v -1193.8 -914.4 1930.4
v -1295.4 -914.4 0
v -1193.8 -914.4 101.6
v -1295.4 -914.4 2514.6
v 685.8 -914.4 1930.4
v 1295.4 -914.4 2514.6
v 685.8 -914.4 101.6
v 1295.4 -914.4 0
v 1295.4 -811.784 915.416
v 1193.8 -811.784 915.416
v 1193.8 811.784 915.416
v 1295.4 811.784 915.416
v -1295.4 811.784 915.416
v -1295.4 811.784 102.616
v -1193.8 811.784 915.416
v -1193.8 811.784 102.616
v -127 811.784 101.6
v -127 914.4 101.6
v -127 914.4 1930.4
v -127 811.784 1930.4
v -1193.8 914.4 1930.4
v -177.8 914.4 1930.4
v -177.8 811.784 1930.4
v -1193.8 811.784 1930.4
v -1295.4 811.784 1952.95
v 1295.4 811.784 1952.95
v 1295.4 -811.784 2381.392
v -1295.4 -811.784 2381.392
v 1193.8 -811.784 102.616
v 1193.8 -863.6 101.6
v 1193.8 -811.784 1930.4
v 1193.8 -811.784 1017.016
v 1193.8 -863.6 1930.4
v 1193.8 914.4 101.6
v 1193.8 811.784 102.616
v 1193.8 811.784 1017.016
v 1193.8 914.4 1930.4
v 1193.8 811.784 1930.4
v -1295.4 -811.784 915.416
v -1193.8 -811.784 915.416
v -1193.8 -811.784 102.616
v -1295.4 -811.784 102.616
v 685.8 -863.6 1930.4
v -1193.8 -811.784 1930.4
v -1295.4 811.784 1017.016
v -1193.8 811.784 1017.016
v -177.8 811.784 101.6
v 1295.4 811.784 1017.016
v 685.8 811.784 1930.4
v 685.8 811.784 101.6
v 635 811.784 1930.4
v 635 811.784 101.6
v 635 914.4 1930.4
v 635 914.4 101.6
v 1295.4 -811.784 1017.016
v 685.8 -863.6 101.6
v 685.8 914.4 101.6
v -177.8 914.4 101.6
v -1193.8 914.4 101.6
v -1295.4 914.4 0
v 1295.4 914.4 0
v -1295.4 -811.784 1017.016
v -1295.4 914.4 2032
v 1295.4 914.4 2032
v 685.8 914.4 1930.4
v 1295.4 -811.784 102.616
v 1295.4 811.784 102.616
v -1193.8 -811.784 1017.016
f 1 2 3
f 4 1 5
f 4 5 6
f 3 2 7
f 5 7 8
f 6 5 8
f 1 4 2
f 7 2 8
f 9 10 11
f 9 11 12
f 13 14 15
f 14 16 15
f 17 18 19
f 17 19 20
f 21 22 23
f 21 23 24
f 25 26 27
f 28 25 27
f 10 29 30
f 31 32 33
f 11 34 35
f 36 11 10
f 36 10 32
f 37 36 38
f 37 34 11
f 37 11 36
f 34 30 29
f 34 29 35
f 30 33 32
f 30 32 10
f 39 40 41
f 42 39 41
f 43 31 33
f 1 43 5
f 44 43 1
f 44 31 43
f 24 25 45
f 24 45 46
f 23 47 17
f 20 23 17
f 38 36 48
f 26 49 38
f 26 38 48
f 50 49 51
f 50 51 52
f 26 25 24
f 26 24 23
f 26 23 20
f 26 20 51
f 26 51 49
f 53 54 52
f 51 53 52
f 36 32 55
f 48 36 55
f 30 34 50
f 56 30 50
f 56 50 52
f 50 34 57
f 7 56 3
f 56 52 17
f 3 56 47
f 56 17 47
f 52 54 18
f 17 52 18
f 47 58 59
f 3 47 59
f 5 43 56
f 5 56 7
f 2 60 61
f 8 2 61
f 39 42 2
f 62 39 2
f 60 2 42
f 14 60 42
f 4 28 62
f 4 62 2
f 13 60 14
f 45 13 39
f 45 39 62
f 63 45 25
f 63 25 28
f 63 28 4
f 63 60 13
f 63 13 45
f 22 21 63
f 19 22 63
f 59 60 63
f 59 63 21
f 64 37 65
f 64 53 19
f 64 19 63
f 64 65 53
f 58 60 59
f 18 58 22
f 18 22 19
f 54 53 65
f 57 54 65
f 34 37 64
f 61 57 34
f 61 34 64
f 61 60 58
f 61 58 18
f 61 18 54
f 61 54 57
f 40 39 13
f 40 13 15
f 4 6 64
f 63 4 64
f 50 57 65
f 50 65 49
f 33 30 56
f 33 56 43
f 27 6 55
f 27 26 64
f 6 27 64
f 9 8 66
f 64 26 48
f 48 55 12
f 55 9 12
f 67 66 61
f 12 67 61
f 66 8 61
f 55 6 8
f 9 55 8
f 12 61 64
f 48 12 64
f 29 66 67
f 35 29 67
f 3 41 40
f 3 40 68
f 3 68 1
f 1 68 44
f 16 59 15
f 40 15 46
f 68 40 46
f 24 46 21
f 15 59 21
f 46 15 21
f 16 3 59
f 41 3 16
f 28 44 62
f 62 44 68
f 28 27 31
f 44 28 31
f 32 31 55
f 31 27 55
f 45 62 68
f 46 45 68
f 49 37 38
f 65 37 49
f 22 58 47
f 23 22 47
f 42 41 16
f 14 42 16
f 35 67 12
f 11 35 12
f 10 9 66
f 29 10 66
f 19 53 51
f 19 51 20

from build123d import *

# Parameters (mm, degrees)
F0_W      = 2590.8
F0_H      = 1828.8
F1_DEPTH  = 2514.6
F3_DEPTH  = 2590.801
F5_DEPTH  = 2590.801
F6_W      = 2387.6
F6_H      = 1828.8
F7_DEPTH  = 1828.801
F8_W      = 101.6
F8_H      = 101.6
F9_DEPTH  = 1625.6
F10_W     = 50.8
F10_H     = 1828.8
F11_DEPTH = 508
F12_W     = 50.8
F12_H     = 102.61595
F13_DEPTH = 1828.8


with BuildPart() as f1:
    # F0 (on Top) → F1 (new body)
    with BuildSketch(Plane.XY):
        Rectangle(F0_W, F0_H)
    extrude(amount=F1_DEPTH)

    # F2 (on face) → F3 (cut, through all)
    with BuildSketch(Plane.YZ.offset(1295.4)):
        Polygon((914.4, 2514.6), (-914.4, 2514.6), (914.4, 2032), align=None)
    extrude(amount=-F3_DEPTH, mode=Mode.SUBTRACT)

    # F4 (on face) → F5 (cut, through all)
    with BuildSketch(Plane.YZ.offset(1295.4)):
        Polygon((811.78405, 102.61595), (811.78405, 1952.950435), (-811.78405, 2381.392017), (-811.78405, 102.61595), align=None)
    extrude(amount=-F5_DEPTH, mode=Mode.SUBTRACT)

    # F6 (on face) → F7 (cut, through all)
    with BuildSketch(Plane(origin=(0, 914.4, 0), x_dir=(-1, 0, 0), z_dir=(0, 1, 0))):
        with Locations((0, 1016)):
            Rectangle(F6_W, F6_H)
    extrude(amount=-F7_DEPTH, mode=Mode.SUBTRACT)

    # F8 (on face) → F9 (join)
    with BuildSketch(Plane.XZ.offset(-811.78405)):
        with Locations((-1244.6, 966.21595)):
            Rectangle(F8_W, F8_H)
        with Locations((1244.6, 966.21595)):
            Rectangle(F8_W, F8_H)
    extrude(amount=F9_DEPTH)

    # F10 (on face) → F11 (join)
    with BuildSketch(Plane(origin=(1193.8, 0, 0), x_dir=(0, -1, 0), z_dir=(-1, 0, 0))):
        with Locations((889, 1016)):
            Rectangle(F10_W, F10_H)
    extrude(amount=F11_DEPTH)

    # F12 (on face) → F13 (join)
    with BuildSketch(Plane(origin=(0, 0, 1930.4), x_dir=(1, 0, 0), z_dir=(0, 0, -1))):
        with Locations((660.4, -863.092025)):
            Rectangle(F12_W, F12_H)
        with Locations((-152.4, -863.092025)):
            Rectangle(F12_W, F12_H)
    extrude(amount=F13_DEPTH)


solid = f1.part
